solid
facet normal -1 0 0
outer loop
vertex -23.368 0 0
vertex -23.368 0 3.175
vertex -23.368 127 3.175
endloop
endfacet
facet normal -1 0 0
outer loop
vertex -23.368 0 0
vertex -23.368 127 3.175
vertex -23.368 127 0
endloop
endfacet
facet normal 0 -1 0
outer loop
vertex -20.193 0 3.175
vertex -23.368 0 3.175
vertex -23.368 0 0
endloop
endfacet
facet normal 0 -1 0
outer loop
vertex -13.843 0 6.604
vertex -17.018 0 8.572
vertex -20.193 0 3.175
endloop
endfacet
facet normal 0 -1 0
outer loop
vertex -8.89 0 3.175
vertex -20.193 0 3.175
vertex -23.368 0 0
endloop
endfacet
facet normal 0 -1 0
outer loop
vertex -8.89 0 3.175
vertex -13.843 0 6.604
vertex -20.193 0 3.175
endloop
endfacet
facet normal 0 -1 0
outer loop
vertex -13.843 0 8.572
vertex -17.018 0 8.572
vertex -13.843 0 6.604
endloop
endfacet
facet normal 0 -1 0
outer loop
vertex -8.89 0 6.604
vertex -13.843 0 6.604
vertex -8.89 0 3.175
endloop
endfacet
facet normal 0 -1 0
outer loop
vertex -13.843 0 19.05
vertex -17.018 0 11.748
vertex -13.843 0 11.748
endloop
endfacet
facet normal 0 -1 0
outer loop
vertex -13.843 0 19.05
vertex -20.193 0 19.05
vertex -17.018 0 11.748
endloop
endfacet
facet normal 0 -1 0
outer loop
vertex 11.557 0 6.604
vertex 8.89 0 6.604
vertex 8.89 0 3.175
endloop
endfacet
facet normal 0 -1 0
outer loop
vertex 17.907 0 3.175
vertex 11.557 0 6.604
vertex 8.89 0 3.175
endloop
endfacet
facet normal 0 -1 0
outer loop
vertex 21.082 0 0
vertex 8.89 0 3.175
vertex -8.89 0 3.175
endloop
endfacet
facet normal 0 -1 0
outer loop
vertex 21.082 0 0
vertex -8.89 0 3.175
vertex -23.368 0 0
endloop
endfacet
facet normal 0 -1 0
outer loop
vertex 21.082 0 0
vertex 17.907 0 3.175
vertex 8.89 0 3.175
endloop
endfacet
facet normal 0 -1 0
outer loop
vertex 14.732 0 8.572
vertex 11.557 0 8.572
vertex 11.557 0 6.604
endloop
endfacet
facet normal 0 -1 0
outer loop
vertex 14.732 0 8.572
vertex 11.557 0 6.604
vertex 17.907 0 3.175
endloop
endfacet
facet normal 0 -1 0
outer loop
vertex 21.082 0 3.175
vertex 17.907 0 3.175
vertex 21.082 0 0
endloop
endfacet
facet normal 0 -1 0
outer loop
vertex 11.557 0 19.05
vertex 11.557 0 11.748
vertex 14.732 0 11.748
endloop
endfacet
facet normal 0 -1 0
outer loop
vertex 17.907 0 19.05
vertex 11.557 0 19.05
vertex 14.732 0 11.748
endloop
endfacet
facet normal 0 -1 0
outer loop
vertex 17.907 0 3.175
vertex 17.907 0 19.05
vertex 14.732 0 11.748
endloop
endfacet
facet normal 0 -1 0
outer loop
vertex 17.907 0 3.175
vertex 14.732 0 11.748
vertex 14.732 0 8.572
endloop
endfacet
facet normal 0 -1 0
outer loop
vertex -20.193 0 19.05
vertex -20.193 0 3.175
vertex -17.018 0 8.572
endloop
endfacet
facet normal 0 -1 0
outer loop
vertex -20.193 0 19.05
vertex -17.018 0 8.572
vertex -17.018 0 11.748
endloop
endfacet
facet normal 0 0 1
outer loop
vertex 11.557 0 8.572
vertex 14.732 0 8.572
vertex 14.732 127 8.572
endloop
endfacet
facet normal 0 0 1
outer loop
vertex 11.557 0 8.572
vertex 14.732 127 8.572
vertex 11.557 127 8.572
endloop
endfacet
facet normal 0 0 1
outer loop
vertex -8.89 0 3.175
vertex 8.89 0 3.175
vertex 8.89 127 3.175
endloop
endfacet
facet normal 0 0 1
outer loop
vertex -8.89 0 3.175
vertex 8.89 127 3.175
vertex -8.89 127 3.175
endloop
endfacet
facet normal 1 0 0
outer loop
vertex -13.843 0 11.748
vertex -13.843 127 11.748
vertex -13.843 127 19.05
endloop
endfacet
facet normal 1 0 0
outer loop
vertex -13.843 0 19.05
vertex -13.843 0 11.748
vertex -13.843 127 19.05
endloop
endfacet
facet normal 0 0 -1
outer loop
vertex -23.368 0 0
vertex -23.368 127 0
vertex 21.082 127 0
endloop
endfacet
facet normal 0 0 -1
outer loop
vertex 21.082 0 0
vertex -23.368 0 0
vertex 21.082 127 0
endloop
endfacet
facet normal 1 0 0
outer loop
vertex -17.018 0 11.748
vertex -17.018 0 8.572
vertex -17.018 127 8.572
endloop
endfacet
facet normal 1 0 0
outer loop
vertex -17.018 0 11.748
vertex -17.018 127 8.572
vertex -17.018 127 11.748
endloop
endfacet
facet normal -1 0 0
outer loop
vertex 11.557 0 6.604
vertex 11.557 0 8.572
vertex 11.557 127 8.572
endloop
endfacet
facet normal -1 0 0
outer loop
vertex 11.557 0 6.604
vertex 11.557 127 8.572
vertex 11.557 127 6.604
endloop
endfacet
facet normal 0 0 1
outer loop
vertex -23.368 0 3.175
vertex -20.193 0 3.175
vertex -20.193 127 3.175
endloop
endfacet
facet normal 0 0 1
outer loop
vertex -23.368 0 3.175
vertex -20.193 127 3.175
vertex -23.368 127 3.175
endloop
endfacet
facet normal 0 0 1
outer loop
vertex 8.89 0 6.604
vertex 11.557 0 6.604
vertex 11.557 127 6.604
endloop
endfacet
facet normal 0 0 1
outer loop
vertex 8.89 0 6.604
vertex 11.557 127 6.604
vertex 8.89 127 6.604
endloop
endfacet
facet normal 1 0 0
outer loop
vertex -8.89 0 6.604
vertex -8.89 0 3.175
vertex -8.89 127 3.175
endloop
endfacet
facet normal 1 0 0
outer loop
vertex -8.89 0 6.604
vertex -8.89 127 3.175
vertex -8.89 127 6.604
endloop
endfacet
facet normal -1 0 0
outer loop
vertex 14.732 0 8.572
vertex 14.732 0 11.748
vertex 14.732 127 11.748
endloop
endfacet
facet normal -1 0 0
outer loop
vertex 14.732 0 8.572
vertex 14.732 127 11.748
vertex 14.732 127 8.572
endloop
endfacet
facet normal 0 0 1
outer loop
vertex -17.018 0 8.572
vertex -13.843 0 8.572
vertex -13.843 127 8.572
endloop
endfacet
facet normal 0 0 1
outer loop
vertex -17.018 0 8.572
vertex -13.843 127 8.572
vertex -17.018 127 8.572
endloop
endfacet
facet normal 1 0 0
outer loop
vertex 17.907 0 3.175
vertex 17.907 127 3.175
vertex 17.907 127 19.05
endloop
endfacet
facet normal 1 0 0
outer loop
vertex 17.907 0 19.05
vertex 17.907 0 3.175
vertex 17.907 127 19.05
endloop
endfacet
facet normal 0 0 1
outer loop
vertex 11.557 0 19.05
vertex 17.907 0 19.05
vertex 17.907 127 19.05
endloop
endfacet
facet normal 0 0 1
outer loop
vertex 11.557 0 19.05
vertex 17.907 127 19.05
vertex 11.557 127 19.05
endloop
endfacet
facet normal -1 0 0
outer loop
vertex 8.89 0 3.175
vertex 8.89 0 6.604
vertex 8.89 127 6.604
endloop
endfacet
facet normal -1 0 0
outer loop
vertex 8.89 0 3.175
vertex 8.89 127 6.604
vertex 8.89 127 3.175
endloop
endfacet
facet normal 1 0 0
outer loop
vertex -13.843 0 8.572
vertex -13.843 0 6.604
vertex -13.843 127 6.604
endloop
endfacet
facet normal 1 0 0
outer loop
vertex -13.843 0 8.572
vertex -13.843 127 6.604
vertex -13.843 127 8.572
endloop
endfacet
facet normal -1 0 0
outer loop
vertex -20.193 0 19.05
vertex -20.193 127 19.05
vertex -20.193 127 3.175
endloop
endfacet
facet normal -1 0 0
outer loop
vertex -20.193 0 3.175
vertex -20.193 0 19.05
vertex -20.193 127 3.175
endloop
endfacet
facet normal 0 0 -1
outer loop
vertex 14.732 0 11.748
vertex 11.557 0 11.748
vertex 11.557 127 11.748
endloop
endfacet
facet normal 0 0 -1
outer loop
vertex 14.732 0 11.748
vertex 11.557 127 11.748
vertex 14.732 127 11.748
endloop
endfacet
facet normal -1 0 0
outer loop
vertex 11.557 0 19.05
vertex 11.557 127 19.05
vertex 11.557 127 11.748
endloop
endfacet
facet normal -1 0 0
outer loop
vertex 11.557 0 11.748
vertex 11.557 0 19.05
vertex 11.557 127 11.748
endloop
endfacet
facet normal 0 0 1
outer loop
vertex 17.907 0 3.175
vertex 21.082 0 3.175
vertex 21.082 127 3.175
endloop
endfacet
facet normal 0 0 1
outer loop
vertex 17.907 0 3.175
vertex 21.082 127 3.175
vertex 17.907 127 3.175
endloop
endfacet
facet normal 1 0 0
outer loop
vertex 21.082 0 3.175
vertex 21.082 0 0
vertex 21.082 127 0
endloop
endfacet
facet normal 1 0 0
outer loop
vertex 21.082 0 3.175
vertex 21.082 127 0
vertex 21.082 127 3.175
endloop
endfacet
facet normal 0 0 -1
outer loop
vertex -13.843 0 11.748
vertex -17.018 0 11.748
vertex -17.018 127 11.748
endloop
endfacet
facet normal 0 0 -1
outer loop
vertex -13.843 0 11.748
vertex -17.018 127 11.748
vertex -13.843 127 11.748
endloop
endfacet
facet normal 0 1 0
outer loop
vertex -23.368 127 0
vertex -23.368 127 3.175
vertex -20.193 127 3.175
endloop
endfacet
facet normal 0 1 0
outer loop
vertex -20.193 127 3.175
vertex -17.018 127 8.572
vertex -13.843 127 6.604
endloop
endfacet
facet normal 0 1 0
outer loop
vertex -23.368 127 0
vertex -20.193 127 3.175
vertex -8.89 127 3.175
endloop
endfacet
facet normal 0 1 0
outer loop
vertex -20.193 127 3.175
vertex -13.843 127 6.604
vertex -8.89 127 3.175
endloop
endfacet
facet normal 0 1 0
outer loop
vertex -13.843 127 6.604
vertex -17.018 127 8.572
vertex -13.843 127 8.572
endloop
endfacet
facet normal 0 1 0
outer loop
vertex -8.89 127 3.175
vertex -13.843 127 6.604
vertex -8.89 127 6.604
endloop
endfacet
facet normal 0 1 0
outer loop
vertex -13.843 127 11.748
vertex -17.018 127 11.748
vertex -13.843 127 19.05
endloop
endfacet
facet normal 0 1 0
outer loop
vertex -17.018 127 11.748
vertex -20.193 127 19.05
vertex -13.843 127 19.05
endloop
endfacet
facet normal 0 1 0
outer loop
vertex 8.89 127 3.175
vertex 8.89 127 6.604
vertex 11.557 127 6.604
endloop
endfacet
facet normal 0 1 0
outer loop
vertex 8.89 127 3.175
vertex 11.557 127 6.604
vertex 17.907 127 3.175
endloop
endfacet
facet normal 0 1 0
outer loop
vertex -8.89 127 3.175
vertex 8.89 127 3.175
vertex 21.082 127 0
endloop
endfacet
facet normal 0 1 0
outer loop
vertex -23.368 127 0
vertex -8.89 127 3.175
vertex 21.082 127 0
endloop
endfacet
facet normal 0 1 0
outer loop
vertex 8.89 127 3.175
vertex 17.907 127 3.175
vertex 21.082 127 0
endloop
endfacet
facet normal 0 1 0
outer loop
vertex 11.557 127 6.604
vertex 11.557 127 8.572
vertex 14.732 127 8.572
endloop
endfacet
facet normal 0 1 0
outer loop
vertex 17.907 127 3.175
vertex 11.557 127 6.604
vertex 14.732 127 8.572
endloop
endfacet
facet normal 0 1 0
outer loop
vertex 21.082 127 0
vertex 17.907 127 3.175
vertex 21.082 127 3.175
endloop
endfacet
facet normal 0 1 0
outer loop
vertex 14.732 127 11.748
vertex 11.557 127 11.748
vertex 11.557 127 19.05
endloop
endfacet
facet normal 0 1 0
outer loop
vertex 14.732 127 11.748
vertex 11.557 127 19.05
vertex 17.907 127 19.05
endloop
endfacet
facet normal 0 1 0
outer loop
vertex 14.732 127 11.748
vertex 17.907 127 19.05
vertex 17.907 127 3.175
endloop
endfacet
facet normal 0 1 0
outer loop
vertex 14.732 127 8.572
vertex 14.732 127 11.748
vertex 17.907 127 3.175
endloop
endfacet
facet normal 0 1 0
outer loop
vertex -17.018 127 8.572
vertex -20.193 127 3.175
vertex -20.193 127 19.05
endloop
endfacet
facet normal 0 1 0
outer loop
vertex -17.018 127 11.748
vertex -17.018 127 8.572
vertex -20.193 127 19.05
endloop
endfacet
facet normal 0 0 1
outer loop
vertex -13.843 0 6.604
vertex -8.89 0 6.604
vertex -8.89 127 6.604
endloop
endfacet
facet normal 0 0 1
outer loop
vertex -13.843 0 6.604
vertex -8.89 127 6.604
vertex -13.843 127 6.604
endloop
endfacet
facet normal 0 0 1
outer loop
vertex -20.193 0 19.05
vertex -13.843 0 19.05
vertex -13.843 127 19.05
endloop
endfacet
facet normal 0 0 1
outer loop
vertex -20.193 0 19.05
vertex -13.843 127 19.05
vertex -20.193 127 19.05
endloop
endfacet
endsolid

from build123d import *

# Parameters (mm, degrees)
F1_DEPTH = 127


with BuildPart() as f1:
    # F0 (on Front) → F1 (new body)
    with BuildSketch(Plane.XZ):
        Polygon((-23.368, 0), (17.907, 0), (21.082, 0), (21.082, 3.175), (17.907, 3.175), (17.907, 19.05), (11.557, 19.05), (11.557, 11.7475), (14.732, 11.7475), (14.732, 8.5725), (11.557, 8.5725), (11.557, 6.604), (8.89, 6.604), (8.89, 3.175), (-8.89, 3.175), (-8.89, 6.604), (-13.843, 6.604), (-13.843, 8.5725), (-17.018, 8.5725), (-17.018, 11.7475), (-13.843, 11.7475), (-13.843, 19.05), (-20.193, 19.05), (-20.193, 3.175), (-23.368, 3.175), align=None)
    extrude(amount=-F1_DEPTH)


solid = f1.part
